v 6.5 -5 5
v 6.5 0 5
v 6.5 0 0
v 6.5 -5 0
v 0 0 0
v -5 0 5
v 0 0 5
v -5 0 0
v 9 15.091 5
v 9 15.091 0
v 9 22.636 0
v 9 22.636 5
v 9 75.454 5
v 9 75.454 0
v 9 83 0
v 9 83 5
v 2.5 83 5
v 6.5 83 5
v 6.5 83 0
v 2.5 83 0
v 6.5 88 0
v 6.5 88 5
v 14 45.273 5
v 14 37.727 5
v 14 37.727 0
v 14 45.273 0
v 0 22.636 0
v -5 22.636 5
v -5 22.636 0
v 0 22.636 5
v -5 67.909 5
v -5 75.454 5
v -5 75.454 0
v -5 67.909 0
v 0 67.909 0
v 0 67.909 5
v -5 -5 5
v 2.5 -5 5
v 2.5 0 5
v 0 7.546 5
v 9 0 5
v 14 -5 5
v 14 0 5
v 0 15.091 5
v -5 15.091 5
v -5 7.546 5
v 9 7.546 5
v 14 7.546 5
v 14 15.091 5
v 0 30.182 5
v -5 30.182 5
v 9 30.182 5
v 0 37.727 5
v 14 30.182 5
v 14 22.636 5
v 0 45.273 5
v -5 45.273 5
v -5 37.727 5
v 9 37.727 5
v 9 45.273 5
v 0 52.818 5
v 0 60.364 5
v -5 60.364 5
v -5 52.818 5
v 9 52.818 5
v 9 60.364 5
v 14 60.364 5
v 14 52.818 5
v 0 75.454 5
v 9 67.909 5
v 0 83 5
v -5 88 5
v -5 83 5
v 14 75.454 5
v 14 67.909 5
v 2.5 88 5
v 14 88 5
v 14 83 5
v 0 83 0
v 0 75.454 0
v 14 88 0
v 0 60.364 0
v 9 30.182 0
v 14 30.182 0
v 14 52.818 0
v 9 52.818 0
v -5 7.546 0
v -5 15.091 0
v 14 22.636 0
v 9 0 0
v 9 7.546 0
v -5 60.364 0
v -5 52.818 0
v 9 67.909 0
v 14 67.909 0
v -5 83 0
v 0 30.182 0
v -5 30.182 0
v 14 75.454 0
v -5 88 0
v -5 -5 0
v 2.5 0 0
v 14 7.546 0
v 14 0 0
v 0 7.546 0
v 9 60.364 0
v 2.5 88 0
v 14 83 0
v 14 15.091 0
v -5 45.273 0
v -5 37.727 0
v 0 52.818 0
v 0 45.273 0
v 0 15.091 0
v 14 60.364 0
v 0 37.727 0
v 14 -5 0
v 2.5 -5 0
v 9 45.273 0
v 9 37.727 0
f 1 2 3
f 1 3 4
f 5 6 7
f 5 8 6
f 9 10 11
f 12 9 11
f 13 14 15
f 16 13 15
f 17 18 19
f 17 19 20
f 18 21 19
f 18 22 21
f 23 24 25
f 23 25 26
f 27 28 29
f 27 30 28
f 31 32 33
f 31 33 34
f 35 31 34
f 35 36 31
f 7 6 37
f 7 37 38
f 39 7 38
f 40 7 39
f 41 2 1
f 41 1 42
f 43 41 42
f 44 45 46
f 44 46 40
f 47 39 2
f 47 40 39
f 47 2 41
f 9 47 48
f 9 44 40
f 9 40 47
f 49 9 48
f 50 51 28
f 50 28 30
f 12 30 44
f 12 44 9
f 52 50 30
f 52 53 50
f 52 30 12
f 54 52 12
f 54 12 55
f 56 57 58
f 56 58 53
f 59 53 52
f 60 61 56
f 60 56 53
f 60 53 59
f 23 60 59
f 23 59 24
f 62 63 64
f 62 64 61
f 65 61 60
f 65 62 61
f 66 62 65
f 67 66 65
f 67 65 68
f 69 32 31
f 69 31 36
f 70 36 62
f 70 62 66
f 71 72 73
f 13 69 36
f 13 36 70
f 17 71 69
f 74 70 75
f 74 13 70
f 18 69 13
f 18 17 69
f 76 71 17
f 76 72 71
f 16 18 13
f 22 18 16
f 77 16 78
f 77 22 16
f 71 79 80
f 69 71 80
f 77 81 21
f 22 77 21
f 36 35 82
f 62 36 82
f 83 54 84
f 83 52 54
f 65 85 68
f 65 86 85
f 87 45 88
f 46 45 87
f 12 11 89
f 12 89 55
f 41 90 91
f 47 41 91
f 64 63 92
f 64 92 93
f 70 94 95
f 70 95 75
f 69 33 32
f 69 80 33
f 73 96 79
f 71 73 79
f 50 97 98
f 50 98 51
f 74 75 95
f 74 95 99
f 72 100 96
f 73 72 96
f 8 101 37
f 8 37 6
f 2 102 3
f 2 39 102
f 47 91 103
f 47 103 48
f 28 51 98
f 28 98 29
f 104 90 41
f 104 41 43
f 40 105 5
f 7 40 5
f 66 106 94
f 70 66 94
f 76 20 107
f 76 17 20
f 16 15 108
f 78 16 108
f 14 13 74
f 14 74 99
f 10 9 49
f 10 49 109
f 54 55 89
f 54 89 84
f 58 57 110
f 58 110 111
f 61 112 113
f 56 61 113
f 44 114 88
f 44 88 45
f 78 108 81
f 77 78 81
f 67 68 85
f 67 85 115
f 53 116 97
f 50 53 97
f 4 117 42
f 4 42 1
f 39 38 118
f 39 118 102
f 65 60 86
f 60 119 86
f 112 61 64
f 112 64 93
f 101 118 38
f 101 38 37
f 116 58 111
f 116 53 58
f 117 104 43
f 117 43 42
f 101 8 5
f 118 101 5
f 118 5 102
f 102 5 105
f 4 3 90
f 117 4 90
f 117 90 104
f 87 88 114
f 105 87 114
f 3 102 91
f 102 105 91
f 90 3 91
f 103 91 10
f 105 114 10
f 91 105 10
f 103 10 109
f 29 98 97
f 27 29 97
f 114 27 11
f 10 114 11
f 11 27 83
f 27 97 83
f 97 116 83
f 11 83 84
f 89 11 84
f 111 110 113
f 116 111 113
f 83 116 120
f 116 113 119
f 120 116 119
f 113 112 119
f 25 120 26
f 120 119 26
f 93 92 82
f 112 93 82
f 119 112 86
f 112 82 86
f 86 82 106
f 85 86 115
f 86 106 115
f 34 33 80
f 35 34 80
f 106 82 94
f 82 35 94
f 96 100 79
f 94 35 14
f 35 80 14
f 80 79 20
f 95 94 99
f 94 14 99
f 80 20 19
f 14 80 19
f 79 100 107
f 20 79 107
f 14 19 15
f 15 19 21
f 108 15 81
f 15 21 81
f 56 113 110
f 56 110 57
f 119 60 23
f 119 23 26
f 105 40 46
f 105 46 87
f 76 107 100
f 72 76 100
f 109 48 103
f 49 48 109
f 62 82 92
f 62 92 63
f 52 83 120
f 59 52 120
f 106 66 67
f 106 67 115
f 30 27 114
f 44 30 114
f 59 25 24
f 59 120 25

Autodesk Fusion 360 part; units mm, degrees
sketch "Sketch1" plane through (0, 0, 0) normal (0, 0, 1) x (1, 0, 0)
  line L0 (0, 0) -> (9, 0)
  line L1 (9, 0) -> (9, 83)
  line L2 (9, 83) -> (0, 83)
  line L3 (0, 83) -> (0, 0)
  dimension "d5" = 9
  dimension "d6" = 83
extrude "Extrude1" add sketch "Sketch1" along normal blind 5
sketch "Sketch2" plane through (9, 0, 0) normal (1, 0, 0) x (0, 1, 0)
  line L0 (0, 0) -> (83, 0)
  line L1 (83, 0) -> (83, 5)
  line L2 (83, 5) -> (0, 5)
  line L3 (0, 5) -> (0, 0)
  line L4 (7.5455, 5) -> (15.0909, 5)
  line L5 (15.0909, 5) -> (15.0909, 0)
  line L6 (15.0909, 0) -> (7.5455, 0)
  line L7 (7.5455, 0) -> (7.5455, 5)
  line L8 (22.6364, 0) -> (22.6364, 5)
  line L9 (22.6364, 5) -> (30.1818, 5)
  line L10 (30.1818, 0) -> (22.6364, 0)
  line L11 (30.1818, 5) -> (30.1818, 0)
  line L12 (37.7273, 0) -> (37.7273, 5)
  line L13 (37.7273, 5) -> (45.2727, 5)
  line L14 (45.2727, 0) -> (37.7273, 0)
  line L15 (45.2727, 5) -> (45.2727, 0)
  line L16 (52.8182, 0) -> (52.8182, 5)
  line L17 (52.8182, 5) -> (60.3636, 5)
  line L18 (60.3636, 0) -> (52.8182, 0)
  line L19 (60.3636, 5) -> (60.3636, 0)
  line L20 (67.9091, 0) -> (67.9091, 5)
  line L21 (67.9091, 5) -> (75.4545, 5)
  line L22 (75.4545, 0) -> (67.9091, 0)
  line L23 (75.4545, 5) -> (75.4545, 0)
  dimension "d9" = 7.5455
  dimension "d10" = 7.5455
  dimension "d13" = 60.3636
  dimension "d14" = 0
extrude "Extrude2" add sketch "Sketch2" along normal blind 5 contours L0 L2 L4 L5 L6 L7 | L0 L2 L8 L9 L10 L11 | L0 L2 L12 L13 L14 L15 | L0 L2 L16 L17 L18 L19 | L0 L2 L20 L21 L22 L23
sketch "Sketch3" plane through (0, 0, 0) normal (-1, 0, 0) x (0, -1, 0)
  line L0 (-83, 0) -> (0, 0)
  line L1 (0, 0) -> (0, 5)
  line L2 (0, 5) -> (-83, 5)
  line L3 (-83, 5) -> (-83, 0)
  line L4 (-75.4545, 5) -> (-67.9091, 5)
  line L5 (-67.9091, 5) -> (-67.9091, 0)
  line L6 (-67.9091, 0) -> (-75.4545, 0)
  line L7 (-75.4545, 0) -> (-75.4545, 5)
  line L8 (-60.3636, 0) -> (-60.3636, 5)
  line L9 (-60.3636, 5) -> (-52.8182, 5)
  line L10 (-52.8182, 0) -> (-60.3636, 0)
  line L11 (-52.8182, 5) -> (-52.8182, 0)
  line L12 (-45.2727, 0) -> (-45.2727, 5)
  line L13 (-45.2727, 5) -> (-37.7273, 5)
  line L14 (-37.7273, 0) -> (-45.2727, 0)
  line L15 (-37.7273, 5) -> (-37.7273, 0)
  line L16 (-30.1818, 0) -> (-30.1818, 5)
  line L17 (-30.1818, 5) -> (-22.6364, 5)
  line L18 (-22.6364, 0) -> (-30.1818, 0)
  line L19 (-22.6364, 5) -> (-22.6364, 0)
  line L20 (-15.0909, 0) -> (-15.0909, 5)
  line L21 (-15.0909, 5) -> (-7.5455, 5)
  line L22 (-7.5455, 0) -> (-15.0909, 0)
  line L23 (-7.5455, 5) -> (-7.5455, 0)
  point P0 (-75.4545, 5)
  dimension "d17" = 7.5455
  dimension "d20" = 60.3636
  dimension "d21" = 0
extrude "Extrude3" add sketch "Sketch3" along normal blind 5 contours L0 L2 L4 L5 L6 L7 | L0 L2 L8 L9 L10 L11 | L0 L2 L12 L13 L14 L15 | L0 L2 L16 L17 L18 L19 | L0 L2 L20 L21 L22 L23
sketch "Sketch4" plane through (0, 0, 0) normal (0, -1, 0) x (1, 0, 0)
  line L0 (0, 0) -> (9, 0)
  line L1 (9, 0) -> (9, 5)
  line L2 (9, 5) -> (0, 5)
  line L3 (0, 5) -> (0, 0)
sketch "Sketch5" plane through (0, 0, 0) normal (0, 0, 1) x (1, 0, 0)
  line L0 (-5, 0) -> (14, 0)
  line L1 (14, 0) -> (14, -5)
  line L2 (14, -5) -> (-5, -5)
  line L3 (-5, -5) -> (-5, 0)
  line L4 (0, 7.5455) -> (0, 0) construction
  line L5 (0, 0) -> (9, 0)
  point P0 (-5, 7.5455)
  dimension "d24" = 5
  dimension "d25" = 19
  dimension "d44" = 5
extrude "Extrude4" cut sketch "Sketch5" along normal blind 5
extrude "Extrude5" add sketch "Sketch5" along normal blind 5
sketch "Sketch6" plane through (0, 0, 0) normal (0, 0, 1) x (1, 0, 0)
  line L0 (-5, 83) -> (14, 83)
  line L1 (14, 83) -> (14, 88)
  line L2 (14, 88) -> (-5, 88)
  line L3 (-5, 88) -> (-5, 83)
  line L4 (9, 83) -> (0, 83)
  point P0 (0, 83)
  point P1 (-5, 75.4545)
  dimension "d31" = 19
  dimension "d32" = 5
  dimension "d43" = 5
extrude "Extrude6" cut sketch "Sketch6" along normal blind 5
extrude "Extrude7" add sketch "Sketch6" along normal blind 5
sketch "Sketch7" plane through (0, 0, 5) normal (0, 0, 1) x (-1, 0, 0)
  line L0 (0, -83) -> (0, -75.4545)
  line L1 (0, -75.4545) -> (5, -75.4545)
  line L2 (5, -75.4545) -> (5, -67.9091)
  line L3 (5, -67.9091) -> (0, -67.9091)
  line L4 (0, -67.9091) -> (0, -60.3636)
  line L5 (0, -60.3636) -> (5, -60.3636)
  line L6 (5, -60.3636) -> (5, -52.8182)
  line L7 (5, -52.8182) -> (0, -52.8182)
  line L8 (0, -52.8182) -> (0, -45.2727)
  line L9 (0, -45.2727) -> (5, -45.2727)
  line L10 (5, -45.2727) -> (5, -37.7273)
  line L11 (5, -37.7273) -> (0, -37.7273)
  line L12 (0, -37.7273) -> (0, -30.1818)
  line L13 (0, -30.1818) -> (5, -30.1818)
  line L14 (5, -30.1818) -> (5, -22.6364)
  line L15 (5, -22.6364) -> (0, -22.6364)
  line L16 (0, -22.6364) -> (0, -15.0909)
  line L17 (0, -15.0909) -> (5, -15.0909)
  line L18 (5, -15.0909) -> (5, -7.5455)
  line L19 (5, -7.5455) -> (0, -7.5455)
  line L20 (0, -7.5455) -> (0, 0)
  line L21 (0, 0) -> (5, 0)
  line L22 (5, 0) -> (5, 5)
  line L23 (5, 5) -> (-14, 5)
  line L24 (-14, 5) -> (-14, 0)
  line L25 (-14, 0) -> (-9, 0)
  line L26 (-9, 0) -> (-9, -7.5455)
  line L27 (-9, -7.5455) -> (-14, -7.5455)
  line L28 (-14, -7.5455) -> (-14, -15.0909)
  line L29 (-14, -15.0909) -> (-9, -15.0909)
  line L30 (-9, -15.0909) -> (-9, -22.6364)
  line L31 (-9, -22.6364) -> (-14, -22.6364)
  line L32 (-14, -22.6364) -> (-14, -30.1818)
  line L33 (-14, -30.1818) -> (-9, -30.1818)
  line L34 (-9, -30.1818) -> (-9, -37.7273)
  line L35 (-9, -37.7273) -> (-14, -37.7273)
  line L36 (-14, -37.7273) -> (-14, -45.2727)
  line L37 (-14, -45.2727) -> (-9, -45.2727)
  line L38 (-9, -45.2727) -> (-9, -52.8182)
  line L39 (-9, -52.8182) -> (-14, -52.8182)
  line L40 (-14, -52.8182) -> (-14, -60.3636)
  line L41 (-14, -60.3636) -> (-9, -60.3636)
  line L42 (-9, -60.3636) -> (-9, -67.9091)
  line L43 (-9, -67.9091) -> (-14, -67.9091)
  line L44 (-14, -67.9091) -> (-14, -75.4545)
  line L45 (-14, -75.4545) -> (-9, -75.4545)
  line L46 (-9, -75.4545) -> (-9, -83)
  line L47 (-9, -83) -> (-14, -83)
  line L48 (-14, -83) -> (-14, -88)
  line L49 (-14, -88) -> (5, -88)
  line L50 (5, -88) -> (5, -83)
  line L51 (5, -83) -> (0, -83)
  line L52 (-2.5, 0) -> (-6.5, 0)
  line L53 (-6.5, 0) -> (-6.5, 5)
  line L54 (-6.5, 5) -> (-2.5, 5)
  line L55 (-2.5, 5) -> (-2.5, 0)
  line L56 (-6.5, 0) -> (-9, 0) construction
  line L57 (0, 0) -> (-2.5, 0) construction
  line L58 (-2.5, -88) -> (-6.5, -88)
  line L59 (-6.5, -88) -> (-6.5, -83)
  line L60 (-6.5, -83) -> (-2.5, -83)
  line L61 (-2.5, -83) -> (-2.5, -88)
  line L62 (-6.5, -83) -> (-9, -83) construction
  line L63 (-2.5, -83) -> (0, -83) construction
  dimension "d41" = 4
  dimension "d42" = 5
  dimension "d45" = 5
  dimension "d46" = 4
extrude "Extrude9" cut sketch "Sketch7" against normal blind 5 contours L23 L52 L53 L54 L55
extrude "Extrude8" cut sketch "Sketch7" against normal blind 5 contours L49 L58 L59 L60 L61
equation "paksus = 5 mm"
equation "pikkus = 83 mm"
equation "pikkus_tapp = pikkus / 11"
equation "laius = 9 mm"
equation "d5 = laius"
equation "d6 = pikkus"
equation "d7 = paksus"
equation "d9 = pikkus_tapp"
equation "d10 = pikkus_tapp"
equation "d13 = pikkus - 2 * pikkus_tapp - pikkus_tapp"
equation "d15 = paksus"
equation "d17 = pikkus_tapp"
equation "d20 = pikkus - 2 * pikkus_tapp - pikkus_tapp"
equation "d22 = paksus"
equation "d24 = paksus"
equation "d25 = 2 * paksus + laius"
equation "d27 = paksus"
equation "d29 = paksus"
equation "d31 = 2 * paksus + laius"
equation "d32 = paksus"
equation "d34 = paksus"
equation "d36 = paksus"
equation "d44 = paksus"
equation "d45 = paksus"
equation "d47 = -paksus"
equation "d49 = -paksus"
